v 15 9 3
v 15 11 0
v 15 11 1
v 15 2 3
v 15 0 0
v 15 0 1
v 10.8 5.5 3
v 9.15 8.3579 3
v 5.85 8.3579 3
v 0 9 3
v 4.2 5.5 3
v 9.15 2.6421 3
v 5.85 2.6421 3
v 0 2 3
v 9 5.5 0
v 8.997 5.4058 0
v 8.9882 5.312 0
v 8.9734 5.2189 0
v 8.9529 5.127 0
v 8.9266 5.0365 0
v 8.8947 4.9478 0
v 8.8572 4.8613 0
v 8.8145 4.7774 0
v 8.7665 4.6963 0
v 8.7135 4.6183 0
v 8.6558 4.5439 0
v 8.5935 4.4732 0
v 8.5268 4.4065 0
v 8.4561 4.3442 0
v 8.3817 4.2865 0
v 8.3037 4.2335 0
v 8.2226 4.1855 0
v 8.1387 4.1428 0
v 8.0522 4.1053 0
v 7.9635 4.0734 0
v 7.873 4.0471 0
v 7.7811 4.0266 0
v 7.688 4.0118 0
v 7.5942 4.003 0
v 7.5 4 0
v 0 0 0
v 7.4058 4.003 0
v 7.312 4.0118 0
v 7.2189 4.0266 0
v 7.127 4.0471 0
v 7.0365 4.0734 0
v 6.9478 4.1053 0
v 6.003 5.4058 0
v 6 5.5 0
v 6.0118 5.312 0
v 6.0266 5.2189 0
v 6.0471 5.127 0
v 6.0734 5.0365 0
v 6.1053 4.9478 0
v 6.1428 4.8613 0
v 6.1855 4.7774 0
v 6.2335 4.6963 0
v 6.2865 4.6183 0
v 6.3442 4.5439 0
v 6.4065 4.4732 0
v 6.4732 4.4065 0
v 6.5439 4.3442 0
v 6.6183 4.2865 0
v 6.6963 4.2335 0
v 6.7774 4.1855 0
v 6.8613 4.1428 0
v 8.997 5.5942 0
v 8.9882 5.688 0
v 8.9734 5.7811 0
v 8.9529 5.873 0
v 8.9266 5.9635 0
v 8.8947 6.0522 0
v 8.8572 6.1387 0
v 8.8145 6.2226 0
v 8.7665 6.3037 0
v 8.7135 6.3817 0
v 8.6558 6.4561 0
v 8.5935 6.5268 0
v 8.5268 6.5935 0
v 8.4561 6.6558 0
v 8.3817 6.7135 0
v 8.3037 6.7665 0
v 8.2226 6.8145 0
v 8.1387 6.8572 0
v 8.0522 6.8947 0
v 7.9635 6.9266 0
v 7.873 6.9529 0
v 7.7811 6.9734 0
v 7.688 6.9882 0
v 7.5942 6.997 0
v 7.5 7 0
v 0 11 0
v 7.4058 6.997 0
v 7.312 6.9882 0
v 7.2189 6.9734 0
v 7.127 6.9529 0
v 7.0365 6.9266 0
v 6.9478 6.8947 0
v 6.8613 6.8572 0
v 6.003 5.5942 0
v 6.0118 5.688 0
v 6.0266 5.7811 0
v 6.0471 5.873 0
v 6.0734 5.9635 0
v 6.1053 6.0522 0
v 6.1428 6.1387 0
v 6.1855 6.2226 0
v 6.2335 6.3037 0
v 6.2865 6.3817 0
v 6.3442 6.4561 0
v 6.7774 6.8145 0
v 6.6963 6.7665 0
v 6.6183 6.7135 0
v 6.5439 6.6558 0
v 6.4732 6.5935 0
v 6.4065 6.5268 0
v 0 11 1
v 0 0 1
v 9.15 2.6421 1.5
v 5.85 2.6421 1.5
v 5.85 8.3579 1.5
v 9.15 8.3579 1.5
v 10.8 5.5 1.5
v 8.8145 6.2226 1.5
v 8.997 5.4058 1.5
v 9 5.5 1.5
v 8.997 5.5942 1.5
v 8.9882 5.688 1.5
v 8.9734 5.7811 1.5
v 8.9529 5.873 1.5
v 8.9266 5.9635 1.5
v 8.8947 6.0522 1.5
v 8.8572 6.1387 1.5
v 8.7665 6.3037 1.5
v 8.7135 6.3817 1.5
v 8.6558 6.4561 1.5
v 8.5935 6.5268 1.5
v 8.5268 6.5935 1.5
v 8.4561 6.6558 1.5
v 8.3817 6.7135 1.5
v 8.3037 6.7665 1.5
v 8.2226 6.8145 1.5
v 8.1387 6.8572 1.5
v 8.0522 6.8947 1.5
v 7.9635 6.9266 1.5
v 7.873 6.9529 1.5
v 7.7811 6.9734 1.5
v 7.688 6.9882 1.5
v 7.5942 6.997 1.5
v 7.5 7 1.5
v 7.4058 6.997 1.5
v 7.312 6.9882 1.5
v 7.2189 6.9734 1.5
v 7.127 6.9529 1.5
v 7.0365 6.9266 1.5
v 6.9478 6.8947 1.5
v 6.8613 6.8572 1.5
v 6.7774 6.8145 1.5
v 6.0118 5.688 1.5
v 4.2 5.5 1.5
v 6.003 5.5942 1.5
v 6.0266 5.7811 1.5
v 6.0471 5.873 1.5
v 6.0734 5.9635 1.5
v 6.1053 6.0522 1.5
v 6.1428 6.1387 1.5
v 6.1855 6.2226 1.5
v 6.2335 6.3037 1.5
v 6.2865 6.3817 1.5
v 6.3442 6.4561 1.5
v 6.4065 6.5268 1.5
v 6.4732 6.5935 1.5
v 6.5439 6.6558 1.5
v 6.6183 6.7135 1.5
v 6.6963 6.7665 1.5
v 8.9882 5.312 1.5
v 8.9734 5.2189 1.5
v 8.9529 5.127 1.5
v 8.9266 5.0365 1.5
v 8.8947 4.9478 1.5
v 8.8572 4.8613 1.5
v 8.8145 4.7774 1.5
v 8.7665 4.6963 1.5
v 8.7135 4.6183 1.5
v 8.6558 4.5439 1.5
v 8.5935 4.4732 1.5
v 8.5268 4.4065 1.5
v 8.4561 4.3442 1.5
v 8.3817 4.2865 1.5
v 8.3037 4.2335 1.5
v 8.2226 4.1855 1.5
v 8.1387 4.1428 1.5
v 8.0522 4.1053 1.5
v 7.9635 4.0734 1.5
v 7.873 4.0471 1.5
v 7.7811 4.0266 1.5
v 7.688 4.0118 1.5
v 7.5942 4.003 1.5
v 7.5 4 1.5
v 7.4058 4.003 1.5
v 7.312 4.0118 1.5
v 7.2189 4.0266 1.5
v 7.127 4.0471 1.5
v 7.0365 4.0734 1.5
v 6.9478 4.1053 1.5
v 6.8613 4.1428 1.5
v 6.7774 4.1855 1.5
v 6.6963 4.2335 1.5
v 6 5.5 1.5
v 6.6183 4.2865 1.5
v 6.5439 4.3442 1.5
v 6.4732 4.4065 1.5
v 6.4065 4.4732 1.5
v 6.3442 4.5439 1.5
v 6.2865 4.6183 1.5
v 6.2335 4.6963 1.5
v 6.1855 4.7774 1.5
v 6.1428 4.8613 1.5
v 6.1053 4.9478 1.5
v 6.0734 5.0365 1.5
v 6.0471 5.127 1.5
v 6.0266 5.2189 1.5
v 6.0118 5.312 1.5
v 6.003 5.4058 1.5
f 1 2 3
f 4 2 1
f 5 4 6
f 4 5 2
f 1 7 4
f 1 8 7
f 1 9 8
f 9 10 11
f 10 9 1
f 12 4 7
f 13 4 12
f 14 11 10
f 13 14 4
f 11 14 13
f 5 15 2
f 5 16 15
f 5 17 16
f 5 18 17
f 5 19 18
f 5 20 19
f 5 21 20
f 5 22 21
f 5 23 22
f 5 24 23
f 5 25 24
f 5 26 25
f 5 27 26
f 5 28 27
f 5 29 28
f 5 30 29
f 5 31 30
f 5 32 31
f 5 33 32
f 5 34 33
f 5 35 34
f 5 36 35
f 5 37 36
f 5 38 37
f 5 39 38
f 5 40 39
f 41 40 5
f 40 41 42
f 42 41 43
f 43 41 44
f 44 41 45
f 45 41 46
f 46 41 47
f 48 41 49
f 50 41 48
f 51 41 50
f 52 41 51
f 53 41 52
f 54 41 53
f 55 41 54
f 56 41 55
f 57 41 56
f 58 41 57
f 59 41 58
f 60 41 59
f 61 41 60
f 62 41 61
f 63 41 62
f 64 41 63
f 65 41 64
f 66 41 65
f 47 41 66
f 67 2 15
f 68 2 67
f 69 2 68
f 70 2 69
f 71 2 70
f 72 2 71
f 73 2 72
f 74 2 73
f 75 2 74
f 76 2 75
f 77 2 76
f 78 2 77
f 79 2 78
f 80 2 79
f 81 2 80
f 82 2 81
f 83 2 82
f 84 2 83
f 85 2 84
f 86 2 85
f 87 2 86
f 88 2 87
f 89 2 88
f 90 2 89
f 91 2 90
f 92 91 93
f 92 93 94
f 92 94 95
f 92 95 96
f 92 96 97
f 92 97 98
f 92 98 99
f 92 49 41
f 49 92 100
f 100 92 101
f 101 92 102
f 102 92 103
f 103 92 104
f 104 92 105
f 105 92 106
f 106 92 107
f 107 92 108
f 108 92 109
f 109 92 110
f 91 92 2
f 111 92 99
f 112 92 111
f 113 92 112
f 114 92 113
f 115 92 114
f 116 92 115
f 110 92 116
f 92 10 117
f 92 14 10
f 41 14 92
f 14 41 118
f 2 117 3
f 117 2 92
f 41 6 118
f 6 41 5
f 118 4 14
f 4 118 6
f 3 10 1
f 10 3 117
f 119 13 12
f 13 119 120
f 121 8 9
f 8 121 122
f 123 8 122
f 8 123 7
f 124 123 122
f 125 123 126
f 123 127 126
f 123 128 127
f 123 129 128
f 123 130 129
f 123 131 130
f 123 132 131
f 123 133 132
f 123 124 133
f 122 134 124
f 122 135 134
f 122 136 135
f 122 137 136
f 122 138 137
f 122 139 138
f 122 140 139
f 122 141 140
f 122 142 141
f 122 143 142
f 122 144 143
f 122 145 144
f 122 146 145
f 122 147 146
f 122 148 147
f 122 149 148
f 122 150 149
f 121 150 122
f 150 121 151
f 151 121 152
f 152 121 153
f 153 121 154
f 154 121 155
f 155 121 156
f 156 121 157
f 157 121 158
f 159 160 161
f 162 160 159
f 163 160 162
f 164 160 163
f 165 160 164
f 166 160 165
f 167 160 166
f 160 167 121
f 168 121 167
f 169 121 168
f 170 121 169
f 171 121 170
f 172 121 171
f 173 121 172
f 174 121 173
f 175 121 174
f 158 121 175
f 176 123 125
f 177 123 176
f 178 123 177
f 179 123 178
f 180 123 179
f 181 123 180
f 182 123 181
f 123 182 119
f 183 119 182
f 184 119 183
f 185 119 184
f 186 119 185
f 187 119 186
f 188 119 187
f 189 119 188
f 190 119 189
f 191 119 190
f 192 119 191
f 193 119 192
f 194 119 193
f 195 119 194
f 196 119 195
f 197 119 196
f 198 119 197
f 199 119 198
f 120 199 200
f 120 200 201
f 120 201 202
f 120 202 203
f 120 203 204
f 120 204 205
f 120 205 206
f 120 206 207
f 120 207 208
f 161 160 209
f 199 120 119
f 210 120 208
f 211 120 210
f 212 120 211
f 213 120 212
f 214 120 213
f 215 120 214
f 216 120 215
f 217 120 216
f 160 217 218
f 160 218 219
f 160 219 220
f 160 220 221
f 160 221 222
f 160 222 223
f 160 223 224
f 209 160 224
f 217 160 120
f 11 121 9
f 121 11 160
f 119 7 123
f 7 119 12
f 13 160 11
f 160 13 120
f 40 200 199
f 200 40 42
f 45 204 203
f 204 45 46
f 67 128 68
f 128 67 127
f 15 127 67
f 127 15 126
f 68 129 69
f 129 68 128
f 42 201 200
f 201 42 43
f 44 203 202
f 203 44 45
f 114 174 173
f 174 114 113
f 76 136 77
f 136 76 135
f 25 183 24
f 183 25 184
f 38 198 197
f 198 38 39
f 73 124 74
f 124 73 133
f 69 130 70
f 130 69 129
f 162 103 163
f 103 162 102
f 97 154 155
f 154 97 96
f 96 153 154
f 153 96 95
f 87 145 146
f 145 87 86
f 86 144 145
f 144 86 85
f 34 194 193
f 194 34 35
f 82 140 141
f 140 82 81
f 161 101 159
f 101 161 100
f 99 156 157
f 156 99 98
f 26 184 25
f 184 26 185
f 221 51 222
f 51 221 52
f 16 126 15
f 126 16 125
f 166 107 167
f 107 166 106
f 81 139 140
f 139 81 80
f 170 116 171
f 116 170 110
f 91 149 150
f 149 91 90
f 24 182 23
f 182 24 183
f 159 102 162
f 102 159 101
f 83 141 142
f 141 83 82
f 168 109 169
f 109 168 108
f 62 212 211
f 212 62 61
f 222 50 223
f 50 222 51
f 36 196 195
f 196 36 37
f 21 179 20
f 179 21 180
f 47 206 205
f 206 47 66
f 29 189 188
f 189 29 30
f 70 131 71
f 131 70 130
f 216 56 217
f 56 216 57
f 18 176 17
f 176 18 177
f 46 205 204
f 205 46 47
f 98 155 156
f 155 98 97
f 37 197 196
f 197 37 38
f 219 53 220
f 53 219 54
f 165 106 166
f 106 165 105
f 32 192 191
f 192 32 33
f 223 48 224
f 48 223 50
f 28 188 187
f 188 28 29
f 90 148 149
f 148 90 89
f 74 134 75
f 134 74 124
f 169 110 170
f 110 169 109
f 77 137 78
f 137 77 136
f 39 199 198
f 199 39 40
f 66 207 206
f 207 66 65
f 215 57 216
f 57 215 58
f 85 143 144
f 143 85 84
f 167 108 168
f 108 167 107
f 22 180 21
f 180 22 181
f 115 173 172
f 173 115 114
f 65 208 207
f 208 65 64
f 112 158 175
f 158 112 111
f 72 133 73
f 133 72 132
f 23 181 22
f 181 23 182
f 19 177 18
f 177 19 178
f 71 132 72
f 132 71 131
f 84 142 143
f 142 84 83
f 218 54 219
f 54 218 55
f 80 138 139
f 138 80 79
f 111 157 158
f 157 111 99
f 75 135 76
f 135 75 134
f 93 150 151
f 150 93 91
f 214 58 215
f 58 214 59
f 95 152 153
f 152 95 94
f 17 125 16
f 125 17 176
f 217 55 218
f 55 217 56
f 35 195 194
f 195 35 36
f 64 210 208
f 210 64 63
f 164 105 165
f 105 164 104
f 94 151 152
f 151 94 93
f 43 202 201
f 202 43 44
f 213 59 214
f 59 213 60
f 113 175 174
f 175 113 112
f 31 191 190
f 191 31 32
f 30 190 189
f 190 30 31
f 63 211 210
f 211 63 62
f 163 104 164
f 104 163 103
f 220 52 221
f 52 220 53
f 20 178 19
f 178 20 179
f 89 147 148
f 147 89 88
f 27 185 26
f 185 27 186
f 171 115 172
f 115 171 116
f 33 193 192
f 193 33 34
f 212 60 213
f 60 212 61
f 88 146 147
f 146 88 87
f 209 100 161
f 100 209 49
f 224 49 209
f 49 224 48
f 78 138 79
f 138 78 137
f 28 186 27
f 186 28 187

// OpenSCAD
w = 11;
l = 15;
h = 3;
nut = 7-0.4;
nut_h =1.5;
dist = 1;
skruv = 3;

difference () {
    cube([l,w,h]);
    translate([0,0,dist]) rotate([45,0,0]) cube([20,20,20]);
    translate([0,w,dist]) rotate([45,0,0]) cube([20,20,20]);
    translate([l/2,w/2,nut_h]) cylinder(d=nut,h=h*5, $fn=6);
    translate([l/2,w/2,-1]) cylinder(d=skruv,h=h*5, $fn=100);
}
